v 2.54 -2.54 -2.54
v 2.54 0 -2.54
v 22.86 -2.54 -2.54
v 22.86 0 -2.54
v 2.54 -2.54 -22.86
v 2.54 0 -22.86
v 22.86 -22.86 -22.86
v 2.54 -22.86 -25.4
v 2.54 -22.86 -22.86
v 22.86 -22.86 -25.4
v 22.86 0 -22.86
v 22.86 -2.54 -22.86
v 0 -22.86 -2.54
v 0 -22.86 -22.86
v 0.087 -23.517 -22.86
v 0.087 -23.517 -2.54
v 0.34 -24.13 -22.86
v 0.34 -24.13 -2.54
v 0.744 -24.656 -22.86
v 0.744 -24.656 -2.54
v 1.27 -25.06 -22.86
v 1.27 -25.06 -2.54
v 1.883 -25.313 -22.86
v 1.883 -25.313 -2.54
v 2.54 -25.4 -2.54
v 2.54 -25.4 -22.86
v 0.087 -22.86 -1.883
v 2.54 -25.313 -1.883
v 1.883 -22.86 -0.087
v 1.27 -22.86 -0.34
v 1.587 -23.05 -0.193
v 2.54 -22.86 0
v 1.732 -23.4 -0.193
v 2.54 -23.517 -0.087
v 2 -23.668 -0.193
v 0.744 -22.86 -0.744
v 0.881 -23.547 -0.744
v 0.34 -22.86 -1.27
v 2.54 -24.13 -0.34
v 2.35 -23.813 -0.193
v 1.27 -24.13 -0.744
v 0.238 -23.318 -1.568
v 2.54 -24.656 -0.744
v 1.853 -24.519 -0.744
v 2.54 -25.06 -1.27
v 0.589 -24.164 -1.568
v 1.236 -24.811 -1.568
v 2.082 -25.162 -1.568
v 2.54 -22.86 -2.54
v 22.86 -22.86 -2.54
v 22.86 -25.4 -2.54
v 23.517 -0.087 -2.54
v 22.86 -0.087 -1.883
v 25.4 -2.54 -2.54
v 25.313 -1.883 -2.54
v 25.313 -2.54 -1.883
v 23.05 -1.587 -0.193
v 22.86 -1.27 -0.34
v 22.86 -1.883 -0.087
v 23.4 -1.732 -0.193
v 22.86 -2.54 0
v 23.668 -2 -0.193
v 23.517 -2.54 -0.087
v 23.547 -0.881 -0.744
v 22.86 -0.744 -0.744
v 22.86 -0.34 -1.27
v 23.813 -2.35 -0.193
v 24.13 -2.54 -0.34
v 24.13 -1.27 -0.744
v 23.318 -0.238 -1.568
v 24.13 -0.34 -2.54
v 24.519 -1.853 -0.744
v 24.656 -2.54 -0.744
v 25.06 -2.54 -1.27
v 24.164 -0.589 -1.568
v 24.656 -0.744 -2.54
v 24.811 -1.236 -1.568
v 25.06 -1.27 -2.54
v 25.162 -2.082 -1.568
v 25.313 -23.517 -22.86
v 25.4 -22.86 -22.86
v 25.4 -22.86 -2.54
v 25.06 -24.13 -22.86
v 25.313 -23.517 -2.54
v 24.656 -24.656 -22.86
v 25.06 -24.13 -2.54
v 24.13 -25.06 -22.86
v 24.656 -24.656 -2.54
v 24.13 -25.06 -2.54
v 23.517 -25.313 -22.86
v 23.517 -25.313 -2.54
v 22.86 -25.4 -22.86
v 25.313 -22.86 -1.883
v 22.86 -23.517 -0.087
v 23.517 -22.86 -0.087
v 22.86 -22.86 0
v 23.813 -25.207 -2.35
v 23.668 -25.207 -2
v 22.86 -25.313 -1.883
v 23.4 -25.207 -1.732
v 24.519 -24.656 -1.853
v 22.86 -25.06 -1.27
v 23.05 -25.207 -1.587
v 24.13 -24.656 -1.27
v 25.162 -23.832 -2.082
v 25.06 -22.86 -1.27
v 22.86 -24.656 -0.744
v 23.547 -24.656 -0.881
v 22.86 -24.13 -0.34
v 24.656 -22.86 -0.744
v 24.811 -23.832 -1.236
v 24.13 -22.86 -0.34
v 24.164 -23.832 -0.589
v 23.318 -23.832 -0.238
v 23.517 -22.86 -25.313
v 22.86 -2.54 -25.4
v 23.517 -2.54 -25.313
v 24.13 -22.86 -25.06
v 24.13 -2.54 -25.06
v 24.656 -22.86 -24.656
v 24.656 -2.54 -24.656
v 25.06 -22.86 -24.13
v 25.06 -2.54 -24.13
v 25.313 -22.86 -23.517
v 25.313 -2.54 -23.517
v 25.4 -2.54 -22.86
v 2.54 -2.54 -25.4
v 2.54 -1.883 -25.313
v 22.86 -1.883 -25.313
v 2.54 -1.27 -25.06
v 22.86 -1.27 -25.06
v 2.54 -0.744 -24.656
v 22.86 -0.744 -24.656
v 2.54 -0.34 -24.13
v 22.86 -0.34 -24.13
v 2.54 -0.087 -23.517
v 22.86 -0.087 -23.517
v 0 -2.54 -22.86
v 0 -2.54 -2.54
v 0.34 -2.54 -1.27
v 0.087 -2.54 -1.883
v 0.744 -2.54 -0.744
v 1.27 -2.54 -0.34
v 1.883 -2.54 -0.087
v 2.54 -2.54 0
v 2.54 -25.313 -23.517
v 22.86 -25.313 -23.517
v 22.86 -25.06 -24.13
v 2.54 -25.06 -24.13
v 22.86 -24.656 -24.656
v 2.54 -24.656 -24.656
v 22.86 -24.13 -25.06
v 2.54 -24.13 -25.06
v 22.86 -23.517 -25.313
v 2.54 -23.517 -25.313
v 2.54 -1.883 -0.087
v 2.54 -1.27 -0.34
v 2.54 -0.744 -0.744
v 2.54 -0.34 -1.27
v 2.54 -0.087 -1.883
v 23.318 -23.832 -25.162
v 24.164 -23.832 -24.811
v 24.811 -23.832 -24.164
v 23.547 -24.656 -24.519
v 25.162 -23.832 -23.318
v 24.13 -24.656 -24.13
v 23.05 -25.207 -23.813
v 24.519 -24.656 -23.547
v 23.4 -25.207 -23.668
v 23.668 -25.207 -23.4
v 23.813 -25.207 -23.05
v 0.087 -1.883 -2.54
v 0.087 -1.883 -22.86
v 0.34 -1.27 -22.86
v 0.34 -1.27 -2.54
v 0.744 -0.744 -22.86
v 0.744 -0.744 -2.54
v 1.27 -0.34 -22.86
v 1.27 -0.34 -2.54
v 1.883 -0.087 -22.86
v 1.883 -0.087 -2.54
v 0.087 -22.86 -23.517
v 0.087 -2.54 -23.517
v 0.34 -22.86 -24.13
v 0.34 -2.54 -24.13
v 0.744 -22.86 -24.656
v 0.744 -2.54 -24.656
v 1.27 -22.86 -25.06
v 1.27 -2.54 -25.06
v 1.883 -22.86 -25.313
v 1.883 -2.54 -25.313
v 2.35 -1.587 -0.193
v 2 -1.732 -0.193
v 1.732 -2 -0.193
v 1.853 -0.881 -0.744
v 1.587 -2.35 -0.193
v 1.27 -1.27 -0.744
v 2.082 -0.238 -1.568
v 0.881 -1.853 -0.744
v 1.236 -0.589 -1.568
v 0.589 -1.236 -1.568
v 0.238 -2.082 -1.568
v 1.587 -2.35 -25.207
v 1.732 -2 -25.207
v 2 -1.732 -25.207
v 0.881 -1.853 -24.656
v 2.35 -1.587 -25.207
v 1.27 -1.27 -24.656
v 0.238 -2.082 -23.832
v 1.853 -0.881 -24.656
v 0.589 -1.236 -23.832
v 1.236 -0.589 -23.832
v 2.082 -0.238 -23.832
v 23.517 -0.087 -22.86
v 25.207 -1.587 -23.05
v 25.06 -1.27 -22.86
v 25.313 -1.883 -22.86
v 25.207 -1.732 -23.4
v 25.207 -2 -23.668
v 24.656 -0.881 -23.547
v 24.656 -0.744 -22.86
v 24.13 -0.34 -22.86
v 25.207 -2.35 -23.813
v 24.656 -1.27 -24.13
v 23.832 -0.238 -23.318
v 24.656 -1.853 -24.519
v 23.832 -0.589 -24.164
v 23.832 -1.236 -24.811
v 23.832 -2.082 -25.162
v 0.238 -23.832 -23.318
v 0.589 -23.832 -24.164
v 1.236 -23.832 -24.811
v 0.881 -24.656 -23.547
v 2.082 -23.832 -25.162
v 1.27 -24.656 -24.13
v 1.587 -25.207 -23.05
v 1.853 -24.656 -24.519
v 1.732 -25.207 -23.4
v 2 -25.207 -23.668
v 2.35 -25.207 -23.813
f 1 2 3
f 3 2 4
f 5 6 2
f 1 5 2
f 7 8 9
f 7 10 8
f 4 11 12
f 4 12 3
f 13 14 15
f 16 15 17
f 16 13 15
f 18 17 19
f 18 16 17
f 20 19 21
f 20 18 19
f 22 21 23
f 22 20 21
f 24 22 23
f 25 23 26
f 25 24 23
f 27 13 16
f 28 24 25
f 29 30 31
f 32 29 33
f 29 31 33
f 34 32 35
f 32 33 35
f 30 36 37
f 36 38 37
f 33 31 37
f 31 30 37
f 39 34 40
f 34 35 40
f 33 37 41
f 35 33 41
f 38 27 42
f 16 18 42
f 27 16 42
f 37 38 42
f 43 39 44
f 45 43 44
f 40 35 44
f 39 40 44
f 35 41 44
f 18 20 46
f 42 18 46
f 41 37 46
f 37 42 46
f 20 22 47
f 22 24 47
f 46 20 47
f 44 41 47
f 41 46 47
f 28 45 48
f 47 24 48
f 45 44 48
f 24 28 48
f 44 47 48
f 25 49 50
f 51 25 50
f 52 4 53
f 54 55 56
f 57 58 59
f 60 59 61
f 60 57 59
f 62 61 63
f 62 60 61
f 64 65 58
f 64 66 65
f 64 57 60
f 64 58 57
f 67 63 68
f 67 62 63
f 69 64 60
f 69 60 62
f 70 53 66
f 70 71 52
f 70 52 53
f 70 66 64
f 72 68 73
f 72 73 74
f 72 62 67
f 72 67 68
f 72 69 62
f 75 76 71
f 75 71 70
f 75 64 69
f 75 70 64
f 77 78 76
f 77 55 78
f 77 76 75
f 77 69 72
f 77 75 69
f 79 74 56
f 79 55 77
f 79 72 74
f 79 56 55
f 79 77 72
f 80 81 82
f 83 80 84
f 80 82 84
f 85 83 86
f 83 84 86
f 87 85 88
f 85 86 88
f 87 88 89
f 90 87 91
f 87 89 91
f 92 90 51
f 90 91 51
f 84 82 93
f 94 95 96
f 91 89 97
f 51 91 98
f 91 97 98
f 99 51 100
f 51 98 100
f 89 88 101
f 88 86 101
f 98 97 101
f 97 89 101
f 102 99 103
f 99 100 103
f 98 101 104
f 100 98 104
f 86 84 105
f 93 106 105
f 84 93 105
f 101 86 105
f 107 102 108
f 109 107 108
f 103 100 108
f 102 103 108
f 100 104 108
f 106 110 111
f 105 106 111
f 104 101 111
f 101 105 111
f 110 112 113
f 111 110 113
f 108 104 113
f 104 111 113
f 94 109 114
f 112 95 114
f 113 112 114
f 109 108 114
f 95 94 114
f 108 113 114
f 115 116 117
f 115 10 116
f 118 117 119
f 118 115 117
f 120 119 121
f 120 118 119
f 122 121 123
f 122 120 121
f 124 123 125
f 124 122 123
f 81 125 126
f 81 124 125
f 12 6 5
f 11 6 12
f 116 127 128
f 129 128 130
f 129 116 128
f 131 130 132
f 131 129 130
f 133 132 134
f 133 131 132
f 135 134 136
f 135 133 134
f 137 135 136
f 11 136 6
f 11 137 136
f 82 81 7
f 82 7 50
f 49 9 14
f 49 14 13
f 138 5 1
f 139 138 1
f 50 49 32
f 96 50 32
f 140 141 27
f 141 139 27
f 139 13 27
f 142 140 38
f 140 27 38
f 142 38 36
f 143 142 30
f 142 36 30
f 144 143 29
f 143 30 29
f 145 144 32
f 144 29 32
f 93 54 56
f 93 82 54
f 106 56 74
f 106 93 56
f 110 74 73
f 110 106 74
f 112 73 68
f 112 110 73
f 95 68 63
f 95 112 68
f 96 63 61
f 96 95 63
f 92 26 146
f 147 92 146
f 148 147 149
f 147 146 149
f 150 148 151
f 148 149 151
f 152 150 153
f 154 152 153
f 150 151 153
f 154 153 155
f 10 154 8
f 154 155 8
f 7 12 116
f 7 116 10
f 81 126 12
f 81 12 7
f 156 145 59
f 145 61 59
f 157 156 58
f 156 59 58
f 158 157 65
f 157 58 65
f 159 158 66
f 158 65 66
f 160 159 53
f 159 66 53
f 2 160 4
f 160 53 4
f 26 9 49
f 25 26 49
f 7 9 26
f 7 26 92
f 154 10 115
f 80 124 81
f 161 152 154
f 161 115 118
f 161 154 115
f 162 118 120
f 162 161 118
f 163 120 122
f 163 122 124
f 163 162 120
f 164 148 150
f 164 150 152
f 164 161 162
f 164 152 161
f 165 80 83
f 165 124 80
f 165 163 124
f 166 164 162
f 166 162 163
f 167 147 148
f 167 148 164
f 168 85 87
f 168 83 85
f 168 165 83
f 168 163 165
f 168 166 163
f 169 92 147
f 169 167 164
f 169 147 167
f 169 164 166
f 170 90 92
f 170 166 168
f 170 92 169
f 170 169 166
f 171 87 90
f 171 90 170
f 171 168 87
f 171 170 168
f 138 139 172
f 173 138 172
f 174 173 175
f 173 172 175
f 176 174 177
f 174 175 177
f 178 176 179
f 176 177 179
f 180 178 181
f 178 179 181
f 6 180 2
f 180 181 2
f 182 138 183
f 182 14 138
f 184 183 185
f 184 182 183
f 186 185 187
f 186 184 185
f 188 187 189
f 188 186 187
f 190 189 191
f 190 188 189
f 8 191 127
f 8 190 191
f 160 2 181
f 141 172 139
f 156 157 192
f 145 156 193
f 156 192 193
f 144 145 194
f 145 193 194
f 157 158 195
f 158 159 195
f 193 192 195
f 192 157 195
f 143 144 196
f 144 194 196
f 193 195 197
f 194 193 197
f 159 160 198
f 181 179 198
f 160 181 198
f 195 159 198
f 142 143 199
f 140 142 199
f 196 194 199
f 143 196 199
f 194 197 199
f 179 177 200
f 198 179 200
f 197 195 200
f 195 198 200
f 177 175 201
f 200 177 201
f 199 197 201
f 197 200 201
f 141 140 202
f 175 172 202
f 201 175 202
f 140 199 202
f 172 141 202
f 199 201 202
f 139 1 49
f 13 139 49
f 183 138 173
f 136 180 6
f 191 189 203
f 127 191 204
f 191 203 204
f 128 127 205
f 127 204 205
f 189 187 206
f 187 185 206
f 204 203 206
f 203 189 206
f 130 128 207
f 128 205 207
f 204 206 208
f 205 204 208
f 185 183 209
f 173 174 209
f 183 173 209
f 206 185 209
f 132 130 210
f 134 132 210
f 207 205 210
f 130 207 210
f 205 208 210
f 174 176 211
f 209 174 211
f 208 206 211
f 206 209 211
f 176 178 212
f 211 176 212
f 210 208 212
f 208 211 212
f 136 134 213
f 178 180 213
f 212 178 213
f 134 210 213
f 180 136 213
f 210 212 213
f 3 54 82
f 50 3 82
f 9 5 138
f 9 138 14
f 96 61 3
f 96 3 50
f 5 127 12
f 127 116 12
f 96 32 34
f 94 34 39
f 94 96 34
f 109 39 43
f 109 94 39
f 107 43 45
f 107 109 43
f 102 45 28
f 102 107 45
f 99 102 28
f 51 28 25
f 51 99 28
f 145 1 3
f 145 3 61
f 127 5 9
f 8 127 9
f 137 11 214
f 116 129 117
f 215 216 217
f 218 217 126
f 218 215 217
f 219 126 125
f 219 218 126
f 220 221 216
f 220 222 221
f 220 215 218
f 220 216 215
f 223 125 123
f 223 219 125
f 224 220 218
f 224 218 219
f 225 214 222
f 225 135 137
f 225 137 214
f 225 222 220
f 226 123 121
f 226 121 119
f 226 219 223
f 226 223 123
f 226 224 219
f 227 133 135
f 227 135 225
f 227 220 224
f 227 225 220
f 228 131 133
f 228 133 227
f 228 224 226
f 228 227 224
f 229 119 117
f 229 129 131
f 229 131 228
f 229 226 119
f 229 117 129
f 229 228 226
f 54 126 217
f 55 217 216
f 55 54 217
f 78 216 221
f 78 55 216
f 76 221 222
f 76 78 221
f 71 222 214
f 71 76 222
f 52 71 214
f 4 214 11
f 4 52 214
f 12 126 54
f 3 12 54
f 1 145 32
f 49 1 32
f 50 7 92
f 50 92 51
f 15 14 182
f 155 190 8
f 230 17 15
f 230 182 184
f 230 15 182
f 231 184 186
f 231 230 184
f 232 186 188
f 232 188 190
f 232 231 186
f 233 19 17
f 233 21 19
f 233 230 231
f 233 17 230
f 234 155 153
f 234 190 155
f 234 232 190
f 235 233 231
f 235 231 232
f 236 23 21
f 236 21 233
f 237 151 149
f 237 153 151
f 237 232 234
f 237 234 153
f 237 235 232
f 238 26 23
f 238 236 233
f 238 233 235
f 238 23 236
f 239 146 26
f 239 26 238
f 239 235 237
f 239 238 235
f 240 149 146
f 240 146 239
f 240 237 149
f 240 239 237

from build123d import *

# Parameters (mm, degrees)
F0_W         = 25.4
F0_H         = 25.4
F1_DEPTH     = 25.4
F2_R         = 2.54
F3_T1_DEPTH  = 20.32
F3_S5_W      = 2.54
F3_S5_H      = 2.54
F3_T6_DEPTH  = 2.54
F3_S11_W     = 2.54
F3_S11_H     = 2.54
F3_T12_DEPTH = 2.54
F4_DEPTH     = 25.401
F5_DEPTH     = 25.401
F6_DEPTH     = 25.401


# Not quite as in the source:
# - a fillet or chamfer that OpenCascade refuses, or shapes differently, is made with other operations: its cross-section is extruded or revolved along the edge and cut away or added


with BuildPart() as f1:
    # F0 (on Front) → F1 (new body)
    with BuildSketch(Plane.XZ):
        with Locations((12.7, -12.7)):
            Rectangle(F0_W, F0_H)
    extrude(amount=F1_DEPTH)

    # F2
    f2_edges = [f1.edges().sort_by_distance(p)[0] for p in [
        (0, 0, -12.7),
        (0, -25.4, -12.7),
        (0, -12.7, -25.4),
        (12.7, 0, -25.4),
        (25.4, 0, -12.7),
        (12.7, 0, 0),
        (0, -12.7, 0),
        (25.4, -12.7, 0),
        (25.4, -12.7, -25.4),
        (25.4, -25.4, -12.7),
        (12.7, -25.4, 0),
    ]]
    fillet(f2_edges, radius=F2_R)

    # F3: fillet of radius 2.54 on 1 edges, made by hand

    # F3_s2 → F3_t1 (cut)
    with BuildSketch(Plane.YZ.offset(2.54)):
        with BuildLine():
            ThreePointArc((-25.4, -22.86), (-24.6560512242, -24.6560512242), (-22.86, -25.4))
            Line((-22.86, -25.4), (-25.4, -25.4))
            Line((-25.4, -25.4), (-25.4, -22.86))
        make_face()
    extrude(amount=F3_T1_DEPTH, mode=Mode.SUBTRACT)


with BuildPart() as f3_tool4:
    # F3_s5 → F3_t6 (new body)
    with BuildSketch(Plane.XZ.offset(22.86)):
        with Locations((1.27, -24.13)):
            Rectangle(F3_S5_W, F3_S5_H)
    extrude(amount=F3_T6_DEPTH)

    # F3_s7 → F3_t8 (revolve, cut)
    with BuildSketch(Plane(origin=(2.54, -22.86, -22.86), x_dir=(0.7071067812, 0, 0.7071067812), z_dir=(0.7071067812, 0, -0.7071067812))):
        with BuildLine():
            ThreePointArc((0, -2.54), (2.54, 0), (0, 2.54))
            Line((0, 2.54), (0, -2.54))
        make_face()
    revolve(axis=Axis((2.54, -22.86, -22.86), (0, -1, 0)), mode=Mode.SUBTRACT)


with BuildPart() as f1_1:
    add(f1.part)

    # F3_t3: cut F3_tool4
    add(f3_tool4.part, mode=Mode.SUBTRACT)


with BuildPart() as f3_tool10:
    # F3_s11 → F3_t12 (new body)
    with BuildSketch(Plane.XZ.offset(22.86)):
        with Locations((24.13, -24.13)):
            Rectangle(F3_S11_W, F3_S11_H)
    extrude(amount=F3_T12_DEPTH)

    # F3_s13 → F3_t14 (revolve, cut)
    with BuildSketch(Plane(origin=(22.86, -22.86, -22.86), x_dir=(-0.7071067812, 0, 0.7071067812), z_dir=(0.7071067812, 0, 0.7071067812))):
        with BuildLine():
            ThreePointArc((0, -2.54), (2.54, 0), (0, 2.54))
            Line((0, 2.54), (0, -2.54))
        make_face()
    revolve(axis=Axis((22.86, -22.86, -22.86), (0, -1, 0)), mode=Mode.SUBTRACT)


with BuildPart() as f1_2:
    add(f1_1.part)

    # F3_t9: cut F3_tool10
    add(f3_tool10.part, mode=Mode.SUBTRACT)

    # F4 (cut, through all): a face of the model
    f4_faces = [f1_2.faces().sort_by_distance(p)[0] for p in [
        (12.7, -12.7, 0),
    ]]
    extrude(f4_faces, amount=-F4_DEPTH, mode=Mode.SUBTRACT)

    # F5 (cut, through all): a face of the model
    f5_faces = [f1_2.faces().sort_by_distance(p)[0] for p in [
        (25.4, -12.7, -12.7),
    ]]
    extrude(f5_faces, amount=-F5_DEPTH, mode=Mode.SUBTRACT)

    # F6 (cut, through all): a face of the model
    f6_faces = [f1_2.faces().sort_by_distance(p)[0] for p in [
        (12.7, 0, -12.7),
    ]]
    extrude(f6_faces, amount=-F6_DEPTH, mode=Mode.SUBTRACT)


solid = f1_2.part
